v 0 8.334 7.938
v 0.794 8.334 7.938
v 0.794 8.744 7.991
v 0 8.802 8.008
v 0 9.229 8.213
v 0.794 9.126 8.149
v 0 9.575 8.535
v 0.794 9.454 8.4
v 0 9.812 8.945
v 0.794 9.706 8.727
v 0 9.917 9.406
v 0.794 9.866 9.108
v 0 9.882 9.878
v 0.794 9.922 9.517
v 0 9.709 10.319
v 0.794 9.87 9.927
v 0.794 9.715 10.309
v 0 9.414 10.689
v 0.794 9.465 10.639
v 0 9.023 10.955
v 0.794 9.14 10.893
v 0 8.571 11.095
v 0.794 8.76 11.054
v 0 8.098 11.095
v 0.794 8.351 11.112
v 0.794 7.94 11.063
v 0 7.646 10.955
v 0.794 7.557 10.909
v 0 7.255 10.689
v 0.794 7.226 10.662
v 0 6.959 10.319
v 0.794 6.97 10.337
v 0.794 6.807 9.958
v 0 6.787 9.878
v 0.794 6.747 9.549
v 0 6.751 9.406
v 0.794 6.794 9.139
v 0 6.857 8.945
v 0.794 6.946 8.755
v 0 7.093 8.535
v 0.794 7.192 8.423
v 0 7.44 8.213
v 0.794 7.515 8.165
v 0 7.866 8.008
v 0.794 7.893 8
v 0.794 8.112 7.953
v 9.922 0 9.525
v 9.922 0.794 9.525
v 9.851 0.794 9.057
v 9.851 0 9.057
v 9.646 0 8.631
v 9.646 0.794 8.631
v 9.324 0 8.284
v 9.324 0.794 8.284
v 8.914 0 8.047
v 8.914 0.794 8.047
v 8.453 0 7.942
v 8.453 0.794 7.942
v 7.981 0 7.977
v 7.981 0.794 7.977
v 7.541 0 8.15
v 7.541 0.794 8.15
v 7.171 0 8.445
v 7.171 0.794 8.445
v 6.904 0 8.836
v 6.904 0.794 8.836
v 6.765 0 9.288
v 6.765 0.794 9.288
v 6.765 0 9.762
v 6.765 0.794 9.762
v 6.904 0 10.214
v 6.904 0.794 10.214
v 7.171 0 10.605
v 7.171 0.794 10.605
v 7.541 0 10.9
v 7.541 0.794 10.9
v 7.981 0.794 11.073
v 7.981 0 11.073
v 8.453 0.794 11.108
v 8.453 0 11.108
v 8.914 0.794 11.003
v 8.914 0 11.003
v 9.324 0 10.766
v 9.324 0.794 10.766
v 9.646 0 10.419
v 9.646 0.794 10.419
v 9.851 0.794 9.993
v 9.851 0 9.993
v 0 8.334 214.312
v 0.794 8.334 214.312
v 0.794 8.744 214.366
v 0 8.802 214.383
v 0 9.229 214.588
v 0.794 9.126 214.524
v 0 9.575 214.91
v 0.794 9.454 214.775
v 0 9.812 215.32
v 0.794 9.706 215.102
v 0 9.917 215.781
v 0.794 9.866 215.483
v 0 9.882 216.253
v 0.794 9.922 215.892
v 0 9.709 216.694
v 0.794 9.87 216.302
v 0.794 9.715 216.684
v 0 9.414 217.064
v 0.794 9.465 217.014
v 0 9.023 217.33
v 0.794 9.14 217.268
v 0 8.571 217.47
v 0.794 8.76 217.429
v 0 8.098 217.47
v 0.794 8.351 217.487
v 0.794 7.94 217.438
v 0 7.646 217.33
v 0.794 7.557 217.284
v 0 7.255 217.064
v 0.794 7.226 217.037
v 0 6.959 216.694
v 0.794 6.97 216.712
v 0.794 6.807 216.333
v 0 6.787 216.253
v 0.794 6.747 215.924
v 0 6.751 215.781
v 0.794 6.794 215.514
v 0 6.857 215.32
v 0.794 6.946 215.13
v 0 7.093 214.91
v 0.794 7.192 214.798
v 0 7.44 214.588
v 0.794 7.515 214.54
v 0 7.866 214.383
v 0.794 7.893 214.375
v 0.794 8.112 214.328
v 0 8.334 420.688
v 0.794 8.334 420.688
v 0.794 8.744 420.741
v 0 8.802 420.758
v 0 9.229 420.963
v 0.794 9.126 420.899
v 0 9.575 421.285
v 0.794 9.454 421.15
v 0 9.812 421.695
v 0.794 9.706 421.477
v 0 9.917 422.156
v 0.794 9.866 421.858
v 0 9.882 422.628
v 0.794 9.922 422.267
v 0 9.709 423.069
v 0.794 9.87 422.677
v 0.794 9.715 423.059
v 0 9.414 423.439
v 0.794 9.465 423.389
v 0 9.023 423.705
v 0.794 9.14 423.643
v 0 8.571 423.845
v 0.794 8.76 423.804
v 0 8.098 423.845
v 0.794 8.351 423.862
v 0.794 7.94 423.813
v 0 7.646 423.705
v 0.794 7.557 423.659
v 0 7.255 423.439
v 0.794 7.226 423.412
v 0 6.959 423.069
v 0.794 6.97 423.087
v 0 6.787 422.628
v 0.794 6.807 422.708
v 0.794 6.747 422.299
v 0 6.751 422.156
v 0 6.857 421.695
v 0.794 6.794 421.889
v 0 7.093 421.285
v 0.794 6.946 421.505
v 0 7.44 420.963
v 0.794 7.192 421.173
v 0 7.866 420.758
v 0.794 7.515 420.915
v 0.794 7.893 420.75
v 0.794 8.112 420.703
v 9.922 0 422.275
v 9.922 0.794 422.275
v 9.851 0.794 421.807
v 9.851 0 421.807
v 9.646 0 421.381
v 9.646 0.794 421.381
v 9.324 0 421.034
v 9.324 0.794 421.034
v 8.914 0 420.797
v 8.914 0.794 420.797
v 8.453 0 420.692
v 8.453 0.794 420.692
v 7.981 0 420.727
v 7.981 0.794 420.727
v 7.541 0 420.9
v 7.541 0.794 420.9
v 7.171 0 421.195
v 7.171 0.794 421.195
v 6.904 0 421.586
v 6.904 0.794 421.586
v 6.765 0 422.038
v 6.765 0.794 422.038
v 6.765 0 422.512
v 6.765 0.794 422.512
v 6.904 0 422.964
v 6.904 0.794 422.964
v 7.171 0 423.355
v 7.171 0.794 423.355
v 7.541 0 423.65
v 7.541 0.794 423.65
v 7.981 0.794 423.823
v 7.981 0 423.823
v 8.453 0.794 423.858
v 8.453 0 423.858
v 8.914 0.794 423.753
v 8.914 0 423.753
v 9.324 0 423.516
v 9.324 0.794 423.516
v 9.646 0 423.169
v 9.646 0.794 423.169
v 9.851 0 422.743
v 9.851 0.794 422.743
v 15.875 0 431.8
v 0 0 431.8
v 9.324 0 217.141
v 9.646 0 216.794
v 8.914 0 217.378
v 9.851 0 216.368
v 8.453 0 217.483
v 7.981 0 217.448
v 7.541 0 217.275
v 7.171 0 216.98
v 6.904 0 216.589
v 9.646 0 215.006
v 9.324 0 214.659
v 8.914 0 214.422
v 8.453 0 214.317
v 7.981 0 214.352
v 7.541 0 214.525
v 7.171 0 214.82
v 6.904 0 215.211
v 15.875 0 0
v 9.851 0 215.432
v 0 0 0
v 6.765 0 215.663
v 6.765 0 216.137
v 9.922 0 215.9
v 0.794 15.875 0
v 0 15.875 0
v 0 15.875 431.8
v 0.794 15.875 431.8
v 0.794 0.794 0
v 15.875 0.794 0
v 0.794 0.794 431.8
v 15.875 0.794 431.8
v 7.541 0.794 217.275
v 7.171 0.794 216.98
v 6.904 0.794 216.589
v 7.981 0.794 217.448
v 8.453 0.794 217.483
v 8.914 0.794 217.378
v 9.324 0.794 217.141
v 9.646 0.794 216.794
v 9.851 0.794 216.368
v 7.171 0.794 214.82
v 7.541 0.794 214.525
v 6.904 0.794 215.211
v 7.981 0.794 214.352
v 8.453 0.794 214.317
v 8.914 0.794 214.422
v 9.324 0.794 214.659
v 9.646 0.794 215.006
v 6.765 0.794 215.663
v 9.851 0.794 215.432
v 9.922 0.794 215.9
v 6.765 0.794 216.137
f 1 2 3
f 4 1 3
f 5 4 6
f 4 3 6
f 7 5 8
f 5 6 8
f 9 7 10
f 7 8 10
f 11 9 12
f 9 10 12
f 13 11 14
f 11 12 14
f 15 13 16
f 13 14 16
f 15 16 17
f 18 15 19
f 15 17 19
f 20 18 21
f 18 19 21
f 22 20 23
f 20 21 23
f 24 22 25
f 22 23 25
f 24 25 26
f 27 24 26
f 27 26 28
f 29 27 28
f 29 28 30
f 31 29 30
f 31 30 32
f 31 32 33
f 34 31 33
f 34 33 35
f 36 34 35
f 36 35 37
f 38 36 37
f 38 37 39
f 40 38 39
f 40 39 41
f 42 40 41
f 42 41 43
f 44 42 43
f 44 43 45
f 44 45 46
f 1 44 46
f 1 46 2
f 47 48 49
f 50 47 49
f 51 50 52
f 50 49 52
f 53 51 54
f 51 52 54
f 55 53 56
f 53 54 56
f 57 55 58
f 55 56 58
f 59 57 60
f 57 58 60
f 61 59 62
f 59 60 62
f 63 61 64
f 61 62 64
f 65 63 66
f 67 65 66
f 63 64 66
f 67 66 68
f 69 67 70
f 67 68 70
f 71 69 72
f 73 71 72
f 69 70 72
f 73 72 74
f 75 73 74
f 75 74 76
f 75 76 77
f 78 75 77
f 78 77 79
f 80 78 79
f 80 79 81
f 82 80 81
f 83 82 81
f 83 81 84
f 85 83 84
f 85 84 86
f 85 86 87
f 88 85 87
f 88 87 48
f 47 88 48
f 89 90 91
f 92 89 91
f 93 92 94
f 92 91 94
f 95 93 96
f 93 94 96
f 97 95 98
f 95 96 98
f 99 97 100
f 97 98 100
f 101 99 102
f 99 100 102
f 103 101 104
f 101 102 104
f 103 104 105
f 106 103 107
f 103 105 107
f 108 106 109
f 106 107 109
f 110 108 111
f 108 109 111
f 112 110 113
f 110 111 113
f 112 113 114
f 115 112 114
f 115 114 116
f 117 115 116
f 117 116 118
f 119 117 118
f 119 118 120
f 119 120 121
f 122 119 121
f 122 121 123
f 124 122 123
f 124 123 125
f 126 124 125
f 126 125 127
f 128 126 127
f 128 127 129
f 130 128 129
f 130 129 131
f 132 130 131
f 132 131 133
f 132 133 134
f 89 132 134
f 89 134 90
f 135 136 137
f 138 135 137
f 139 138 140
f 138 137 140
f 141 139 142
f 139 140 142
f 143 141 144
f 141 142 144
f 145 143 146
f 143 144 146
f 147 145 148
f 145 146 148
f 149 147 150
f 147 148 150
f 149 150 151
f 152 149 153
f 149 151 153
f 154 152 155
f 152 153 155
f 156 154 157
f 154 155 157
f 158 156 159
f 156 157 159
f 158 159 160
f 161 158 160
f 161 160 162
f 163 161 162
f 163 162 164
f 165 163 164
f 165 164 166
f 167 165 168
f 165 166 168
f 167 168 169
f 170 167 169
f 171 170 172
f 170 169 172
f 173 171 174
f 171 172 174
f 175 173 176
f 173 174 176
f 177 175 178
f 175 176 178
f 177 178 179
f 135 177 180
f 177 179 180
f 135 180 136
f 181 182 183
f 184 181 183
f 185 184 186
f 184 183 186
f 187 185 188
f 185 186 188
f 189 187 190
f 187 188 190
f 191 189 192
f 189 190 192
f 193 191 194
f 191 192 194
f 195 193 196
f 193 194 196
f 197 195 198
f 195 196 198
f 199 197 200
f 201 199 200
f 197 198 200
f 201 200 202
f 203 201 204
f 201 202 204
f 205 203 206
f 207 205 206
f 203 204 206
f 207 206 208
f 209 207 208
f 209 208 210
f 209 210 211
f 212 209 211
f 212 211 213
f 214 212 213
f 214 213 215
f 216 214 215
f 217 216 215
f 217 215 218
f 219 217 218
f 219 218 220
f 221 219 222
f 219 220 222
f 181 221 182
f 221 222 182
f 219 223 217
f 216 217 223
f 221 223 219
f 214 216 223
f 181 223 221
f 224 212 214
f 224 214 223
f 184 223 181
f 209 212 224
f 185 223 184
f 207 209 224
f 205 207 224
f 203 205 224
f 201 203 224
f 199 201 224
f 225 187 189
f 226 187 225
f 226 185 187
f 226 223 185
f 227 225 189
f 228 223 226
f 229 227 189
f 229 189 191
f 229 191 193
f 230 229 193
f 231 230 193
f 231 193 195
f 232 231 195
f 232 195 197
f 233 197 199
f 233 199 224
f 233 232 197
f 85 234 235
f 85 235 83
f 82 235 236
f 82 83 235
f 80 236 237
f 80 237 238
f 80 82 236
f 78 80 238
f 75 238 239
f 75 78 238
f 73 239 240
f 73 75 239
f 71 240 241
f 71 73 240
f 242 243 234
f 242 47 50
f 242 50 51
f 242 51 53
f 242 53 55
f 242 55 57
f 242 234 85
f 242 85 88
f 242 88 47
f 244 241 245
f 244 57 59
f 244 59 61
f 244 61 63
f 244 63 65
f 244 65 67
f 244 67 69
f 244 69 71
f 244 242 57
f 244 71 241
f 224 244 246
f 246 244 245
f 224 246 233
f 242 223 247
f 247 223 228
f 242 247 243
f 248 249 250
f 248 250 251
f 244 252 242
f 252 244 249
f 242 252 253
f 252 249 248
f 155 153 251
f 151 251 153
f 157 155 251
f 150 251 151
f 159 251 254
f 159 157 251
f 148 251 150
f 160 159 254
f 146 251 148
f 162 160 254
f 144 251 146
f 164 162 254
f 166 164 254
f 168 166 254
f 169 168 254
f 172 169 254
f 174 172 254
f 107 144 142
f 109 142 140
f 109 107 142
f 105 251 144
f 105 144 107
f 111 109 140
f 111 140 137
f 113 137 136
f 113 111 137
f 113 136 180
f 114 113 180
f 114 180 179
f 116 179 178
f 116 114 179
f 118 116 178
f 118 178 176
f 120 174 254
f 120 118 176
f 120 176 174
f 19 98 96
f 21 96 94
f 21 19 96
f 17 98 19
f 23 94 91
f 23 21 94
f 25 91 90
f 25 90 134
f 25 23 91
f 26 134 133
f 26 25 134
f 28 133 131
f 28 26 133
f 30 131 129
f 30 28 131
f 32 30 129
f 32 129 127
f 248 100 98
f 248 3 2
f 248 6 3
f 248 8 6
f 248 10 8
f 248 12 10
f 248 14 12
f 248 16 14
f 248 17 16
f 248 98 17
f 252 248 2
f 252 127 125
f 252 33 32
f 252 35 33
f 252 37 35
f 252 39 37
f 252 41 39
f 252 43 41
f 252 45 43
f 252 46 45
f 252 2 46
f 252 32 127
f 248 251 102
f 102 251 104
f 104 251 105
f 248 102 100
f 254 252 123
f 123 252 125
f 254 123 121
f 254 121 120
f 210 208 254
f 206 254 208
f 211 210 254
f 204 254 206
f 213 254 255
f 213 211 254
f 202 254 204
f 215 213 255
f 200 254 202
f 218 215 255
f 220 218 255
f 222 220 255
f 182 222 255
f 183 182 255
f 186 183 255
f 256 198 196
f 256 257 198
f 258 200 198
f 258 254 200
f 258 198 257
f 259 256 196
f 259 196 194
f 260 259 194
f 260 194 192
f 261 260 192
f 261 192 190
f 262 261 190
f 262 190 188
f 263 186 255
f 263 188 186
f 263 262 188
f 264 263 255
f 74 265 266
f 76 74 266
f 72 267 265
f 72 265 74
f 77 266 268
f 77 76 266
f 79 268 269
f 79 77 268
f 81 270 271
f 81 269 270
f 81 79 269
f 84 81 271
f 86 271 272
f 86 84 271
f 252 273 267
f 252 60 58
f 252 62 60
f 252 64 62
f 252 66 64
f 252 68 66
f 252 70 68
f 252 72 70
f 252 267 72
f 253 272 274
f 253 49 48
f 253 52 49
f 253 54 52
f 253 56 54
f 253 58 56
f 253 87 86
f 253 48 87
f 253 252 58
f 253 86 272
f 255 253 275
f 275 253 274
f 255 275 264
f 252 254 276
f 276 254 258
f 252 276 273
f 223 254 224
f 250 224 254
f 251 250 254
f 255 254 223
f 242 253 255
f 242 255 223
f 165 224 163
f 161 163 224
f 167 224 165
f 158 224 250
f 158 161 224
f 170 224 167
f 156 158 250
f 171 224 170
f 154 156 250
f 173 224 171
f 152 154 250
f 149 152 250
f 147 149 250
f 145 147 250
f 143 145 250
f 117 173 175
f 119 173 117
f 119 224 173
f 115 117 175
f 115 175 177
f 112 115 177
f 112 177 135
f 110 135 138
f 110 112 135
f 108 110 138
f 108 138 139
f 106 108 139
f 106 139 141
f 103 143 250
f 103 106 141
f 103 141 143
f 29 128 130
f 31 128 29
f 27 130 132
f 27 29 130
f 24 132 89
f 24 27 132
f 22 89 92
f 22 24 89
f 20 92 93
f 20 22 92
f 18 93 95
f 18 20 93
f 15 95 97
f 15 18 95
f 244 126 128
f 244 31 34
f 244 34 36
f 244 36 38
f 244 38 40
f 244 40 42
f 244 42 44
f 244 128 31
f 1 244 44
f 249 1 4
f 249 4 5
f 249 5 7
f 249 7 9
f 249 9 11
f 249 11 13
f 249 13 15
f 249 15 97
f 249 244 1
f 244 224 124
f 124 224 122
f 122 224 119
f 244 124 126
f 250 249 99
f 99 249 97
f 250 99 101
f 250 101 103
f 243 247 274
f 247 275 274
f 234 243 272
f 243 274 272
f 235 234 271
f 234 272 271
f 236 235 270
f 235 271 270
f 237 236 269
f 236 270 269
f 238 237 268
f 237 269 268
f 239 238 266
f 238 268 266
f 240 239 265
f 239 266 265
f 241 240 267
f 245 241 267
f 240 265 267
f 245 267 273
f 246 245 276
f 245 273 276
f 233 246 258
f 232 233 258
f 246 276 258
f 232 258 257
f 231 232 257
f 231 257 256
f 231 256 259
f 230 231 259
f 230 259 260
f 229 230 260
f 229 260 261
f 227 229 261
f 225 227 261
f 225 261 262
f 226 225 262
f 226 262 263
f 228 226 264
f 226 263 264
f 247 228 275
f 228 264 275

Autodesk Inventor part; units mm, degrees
ref_plane "YZ Plane" through (0, 0, 0) normal (1, 0, 0) x (0, 1, 0)
ref_plane "XZ Plane" through (0, 0, 0) normal (0, 1, 0) x (-1, 0, 0)
ref_plane "XY Plane" through (0, 0, 0) normal (0, 0, 1) x (1, 0, 0)
sketch "Sketch1" plane through (0, 0, 0) normal (0, 0, 1) x (1, 0, 0)
  line L0 (0, 0) -> (0, 15.875)
  line L1 (0, 15.875) -> (0.7937, 15.875)
  line L2 (0.7937, 15.875) -> (0.7938, 0.7937)
  line L3 (0.7938, 0.7937) -> (15.875, 0.7937)
  line L4 (15.875, 0.7937) -> (15.875, 0)
  line L5 (15.875, 0) -> (0, 0)
  dimension "d0" = 15.875
  dimension "d1" = 0.7937
extrude "Extrusion1" add sketch "Sketch1" along normal blind 431.8
sketch "Sketch2" plane through (0.7938, 0.7937, 0) normal (0, 1, 0) x (1, 0, 0)
  line L0 (0, 0) -> (15.0812, 0) projected
  line L1 (15.0812, -431.8) -> (0, -431.8) projected
  line L2 (7.5406, 0) -> (7.5406, -431.8) construction
  circle A0 centre (7.5406, -9.525) radius 1.5875
  circle A1 centre (7.5406, -215.9) radius 1.5875
  circle A2 centre (7.5406, -422.275) radius 1.5875
  point P0 (-0.7938, 0)
  dimension "d4" = 9.525
  dimension "d5" = 3.175
  dimension "d6" = 431.8
  dimension "d9" = 206.375
sketch "Sketch3" plane through (0.7938, 0.7937, 0) normal (1, 0, 0) x (0, 0, -1)
  line L0 (0, 15.0812) -> (0, 0) projected
  line L1 (-431.8, 0) -> (-431.8, 15.0812) projected
  line L2 (-431.8, 7.5406) -> (0, 7.5406) construction
  circle A0 centre (-9.525, 7.5406) radius 1.5875
  circle A1 centre (-215.9, 7.5406) radius 1.5875
  circle A2 centre (-422.275, 7.5406) radius 1.5875
  point P0 (0, -0.7937)
  dimension "d14" = 3.175
  dimension "d15" = 9.525
  dimension "d16" = 431.8
  dimension "d19" = 206.375
extrude "Extrusion2" cut sketch "Sketch2" against normal through all
extrude "Extrusion3" cut sketch "Sketch3" against normal through all
properties part number "Hopper Bracing Front Top P8" material "Aluminum 6061"
